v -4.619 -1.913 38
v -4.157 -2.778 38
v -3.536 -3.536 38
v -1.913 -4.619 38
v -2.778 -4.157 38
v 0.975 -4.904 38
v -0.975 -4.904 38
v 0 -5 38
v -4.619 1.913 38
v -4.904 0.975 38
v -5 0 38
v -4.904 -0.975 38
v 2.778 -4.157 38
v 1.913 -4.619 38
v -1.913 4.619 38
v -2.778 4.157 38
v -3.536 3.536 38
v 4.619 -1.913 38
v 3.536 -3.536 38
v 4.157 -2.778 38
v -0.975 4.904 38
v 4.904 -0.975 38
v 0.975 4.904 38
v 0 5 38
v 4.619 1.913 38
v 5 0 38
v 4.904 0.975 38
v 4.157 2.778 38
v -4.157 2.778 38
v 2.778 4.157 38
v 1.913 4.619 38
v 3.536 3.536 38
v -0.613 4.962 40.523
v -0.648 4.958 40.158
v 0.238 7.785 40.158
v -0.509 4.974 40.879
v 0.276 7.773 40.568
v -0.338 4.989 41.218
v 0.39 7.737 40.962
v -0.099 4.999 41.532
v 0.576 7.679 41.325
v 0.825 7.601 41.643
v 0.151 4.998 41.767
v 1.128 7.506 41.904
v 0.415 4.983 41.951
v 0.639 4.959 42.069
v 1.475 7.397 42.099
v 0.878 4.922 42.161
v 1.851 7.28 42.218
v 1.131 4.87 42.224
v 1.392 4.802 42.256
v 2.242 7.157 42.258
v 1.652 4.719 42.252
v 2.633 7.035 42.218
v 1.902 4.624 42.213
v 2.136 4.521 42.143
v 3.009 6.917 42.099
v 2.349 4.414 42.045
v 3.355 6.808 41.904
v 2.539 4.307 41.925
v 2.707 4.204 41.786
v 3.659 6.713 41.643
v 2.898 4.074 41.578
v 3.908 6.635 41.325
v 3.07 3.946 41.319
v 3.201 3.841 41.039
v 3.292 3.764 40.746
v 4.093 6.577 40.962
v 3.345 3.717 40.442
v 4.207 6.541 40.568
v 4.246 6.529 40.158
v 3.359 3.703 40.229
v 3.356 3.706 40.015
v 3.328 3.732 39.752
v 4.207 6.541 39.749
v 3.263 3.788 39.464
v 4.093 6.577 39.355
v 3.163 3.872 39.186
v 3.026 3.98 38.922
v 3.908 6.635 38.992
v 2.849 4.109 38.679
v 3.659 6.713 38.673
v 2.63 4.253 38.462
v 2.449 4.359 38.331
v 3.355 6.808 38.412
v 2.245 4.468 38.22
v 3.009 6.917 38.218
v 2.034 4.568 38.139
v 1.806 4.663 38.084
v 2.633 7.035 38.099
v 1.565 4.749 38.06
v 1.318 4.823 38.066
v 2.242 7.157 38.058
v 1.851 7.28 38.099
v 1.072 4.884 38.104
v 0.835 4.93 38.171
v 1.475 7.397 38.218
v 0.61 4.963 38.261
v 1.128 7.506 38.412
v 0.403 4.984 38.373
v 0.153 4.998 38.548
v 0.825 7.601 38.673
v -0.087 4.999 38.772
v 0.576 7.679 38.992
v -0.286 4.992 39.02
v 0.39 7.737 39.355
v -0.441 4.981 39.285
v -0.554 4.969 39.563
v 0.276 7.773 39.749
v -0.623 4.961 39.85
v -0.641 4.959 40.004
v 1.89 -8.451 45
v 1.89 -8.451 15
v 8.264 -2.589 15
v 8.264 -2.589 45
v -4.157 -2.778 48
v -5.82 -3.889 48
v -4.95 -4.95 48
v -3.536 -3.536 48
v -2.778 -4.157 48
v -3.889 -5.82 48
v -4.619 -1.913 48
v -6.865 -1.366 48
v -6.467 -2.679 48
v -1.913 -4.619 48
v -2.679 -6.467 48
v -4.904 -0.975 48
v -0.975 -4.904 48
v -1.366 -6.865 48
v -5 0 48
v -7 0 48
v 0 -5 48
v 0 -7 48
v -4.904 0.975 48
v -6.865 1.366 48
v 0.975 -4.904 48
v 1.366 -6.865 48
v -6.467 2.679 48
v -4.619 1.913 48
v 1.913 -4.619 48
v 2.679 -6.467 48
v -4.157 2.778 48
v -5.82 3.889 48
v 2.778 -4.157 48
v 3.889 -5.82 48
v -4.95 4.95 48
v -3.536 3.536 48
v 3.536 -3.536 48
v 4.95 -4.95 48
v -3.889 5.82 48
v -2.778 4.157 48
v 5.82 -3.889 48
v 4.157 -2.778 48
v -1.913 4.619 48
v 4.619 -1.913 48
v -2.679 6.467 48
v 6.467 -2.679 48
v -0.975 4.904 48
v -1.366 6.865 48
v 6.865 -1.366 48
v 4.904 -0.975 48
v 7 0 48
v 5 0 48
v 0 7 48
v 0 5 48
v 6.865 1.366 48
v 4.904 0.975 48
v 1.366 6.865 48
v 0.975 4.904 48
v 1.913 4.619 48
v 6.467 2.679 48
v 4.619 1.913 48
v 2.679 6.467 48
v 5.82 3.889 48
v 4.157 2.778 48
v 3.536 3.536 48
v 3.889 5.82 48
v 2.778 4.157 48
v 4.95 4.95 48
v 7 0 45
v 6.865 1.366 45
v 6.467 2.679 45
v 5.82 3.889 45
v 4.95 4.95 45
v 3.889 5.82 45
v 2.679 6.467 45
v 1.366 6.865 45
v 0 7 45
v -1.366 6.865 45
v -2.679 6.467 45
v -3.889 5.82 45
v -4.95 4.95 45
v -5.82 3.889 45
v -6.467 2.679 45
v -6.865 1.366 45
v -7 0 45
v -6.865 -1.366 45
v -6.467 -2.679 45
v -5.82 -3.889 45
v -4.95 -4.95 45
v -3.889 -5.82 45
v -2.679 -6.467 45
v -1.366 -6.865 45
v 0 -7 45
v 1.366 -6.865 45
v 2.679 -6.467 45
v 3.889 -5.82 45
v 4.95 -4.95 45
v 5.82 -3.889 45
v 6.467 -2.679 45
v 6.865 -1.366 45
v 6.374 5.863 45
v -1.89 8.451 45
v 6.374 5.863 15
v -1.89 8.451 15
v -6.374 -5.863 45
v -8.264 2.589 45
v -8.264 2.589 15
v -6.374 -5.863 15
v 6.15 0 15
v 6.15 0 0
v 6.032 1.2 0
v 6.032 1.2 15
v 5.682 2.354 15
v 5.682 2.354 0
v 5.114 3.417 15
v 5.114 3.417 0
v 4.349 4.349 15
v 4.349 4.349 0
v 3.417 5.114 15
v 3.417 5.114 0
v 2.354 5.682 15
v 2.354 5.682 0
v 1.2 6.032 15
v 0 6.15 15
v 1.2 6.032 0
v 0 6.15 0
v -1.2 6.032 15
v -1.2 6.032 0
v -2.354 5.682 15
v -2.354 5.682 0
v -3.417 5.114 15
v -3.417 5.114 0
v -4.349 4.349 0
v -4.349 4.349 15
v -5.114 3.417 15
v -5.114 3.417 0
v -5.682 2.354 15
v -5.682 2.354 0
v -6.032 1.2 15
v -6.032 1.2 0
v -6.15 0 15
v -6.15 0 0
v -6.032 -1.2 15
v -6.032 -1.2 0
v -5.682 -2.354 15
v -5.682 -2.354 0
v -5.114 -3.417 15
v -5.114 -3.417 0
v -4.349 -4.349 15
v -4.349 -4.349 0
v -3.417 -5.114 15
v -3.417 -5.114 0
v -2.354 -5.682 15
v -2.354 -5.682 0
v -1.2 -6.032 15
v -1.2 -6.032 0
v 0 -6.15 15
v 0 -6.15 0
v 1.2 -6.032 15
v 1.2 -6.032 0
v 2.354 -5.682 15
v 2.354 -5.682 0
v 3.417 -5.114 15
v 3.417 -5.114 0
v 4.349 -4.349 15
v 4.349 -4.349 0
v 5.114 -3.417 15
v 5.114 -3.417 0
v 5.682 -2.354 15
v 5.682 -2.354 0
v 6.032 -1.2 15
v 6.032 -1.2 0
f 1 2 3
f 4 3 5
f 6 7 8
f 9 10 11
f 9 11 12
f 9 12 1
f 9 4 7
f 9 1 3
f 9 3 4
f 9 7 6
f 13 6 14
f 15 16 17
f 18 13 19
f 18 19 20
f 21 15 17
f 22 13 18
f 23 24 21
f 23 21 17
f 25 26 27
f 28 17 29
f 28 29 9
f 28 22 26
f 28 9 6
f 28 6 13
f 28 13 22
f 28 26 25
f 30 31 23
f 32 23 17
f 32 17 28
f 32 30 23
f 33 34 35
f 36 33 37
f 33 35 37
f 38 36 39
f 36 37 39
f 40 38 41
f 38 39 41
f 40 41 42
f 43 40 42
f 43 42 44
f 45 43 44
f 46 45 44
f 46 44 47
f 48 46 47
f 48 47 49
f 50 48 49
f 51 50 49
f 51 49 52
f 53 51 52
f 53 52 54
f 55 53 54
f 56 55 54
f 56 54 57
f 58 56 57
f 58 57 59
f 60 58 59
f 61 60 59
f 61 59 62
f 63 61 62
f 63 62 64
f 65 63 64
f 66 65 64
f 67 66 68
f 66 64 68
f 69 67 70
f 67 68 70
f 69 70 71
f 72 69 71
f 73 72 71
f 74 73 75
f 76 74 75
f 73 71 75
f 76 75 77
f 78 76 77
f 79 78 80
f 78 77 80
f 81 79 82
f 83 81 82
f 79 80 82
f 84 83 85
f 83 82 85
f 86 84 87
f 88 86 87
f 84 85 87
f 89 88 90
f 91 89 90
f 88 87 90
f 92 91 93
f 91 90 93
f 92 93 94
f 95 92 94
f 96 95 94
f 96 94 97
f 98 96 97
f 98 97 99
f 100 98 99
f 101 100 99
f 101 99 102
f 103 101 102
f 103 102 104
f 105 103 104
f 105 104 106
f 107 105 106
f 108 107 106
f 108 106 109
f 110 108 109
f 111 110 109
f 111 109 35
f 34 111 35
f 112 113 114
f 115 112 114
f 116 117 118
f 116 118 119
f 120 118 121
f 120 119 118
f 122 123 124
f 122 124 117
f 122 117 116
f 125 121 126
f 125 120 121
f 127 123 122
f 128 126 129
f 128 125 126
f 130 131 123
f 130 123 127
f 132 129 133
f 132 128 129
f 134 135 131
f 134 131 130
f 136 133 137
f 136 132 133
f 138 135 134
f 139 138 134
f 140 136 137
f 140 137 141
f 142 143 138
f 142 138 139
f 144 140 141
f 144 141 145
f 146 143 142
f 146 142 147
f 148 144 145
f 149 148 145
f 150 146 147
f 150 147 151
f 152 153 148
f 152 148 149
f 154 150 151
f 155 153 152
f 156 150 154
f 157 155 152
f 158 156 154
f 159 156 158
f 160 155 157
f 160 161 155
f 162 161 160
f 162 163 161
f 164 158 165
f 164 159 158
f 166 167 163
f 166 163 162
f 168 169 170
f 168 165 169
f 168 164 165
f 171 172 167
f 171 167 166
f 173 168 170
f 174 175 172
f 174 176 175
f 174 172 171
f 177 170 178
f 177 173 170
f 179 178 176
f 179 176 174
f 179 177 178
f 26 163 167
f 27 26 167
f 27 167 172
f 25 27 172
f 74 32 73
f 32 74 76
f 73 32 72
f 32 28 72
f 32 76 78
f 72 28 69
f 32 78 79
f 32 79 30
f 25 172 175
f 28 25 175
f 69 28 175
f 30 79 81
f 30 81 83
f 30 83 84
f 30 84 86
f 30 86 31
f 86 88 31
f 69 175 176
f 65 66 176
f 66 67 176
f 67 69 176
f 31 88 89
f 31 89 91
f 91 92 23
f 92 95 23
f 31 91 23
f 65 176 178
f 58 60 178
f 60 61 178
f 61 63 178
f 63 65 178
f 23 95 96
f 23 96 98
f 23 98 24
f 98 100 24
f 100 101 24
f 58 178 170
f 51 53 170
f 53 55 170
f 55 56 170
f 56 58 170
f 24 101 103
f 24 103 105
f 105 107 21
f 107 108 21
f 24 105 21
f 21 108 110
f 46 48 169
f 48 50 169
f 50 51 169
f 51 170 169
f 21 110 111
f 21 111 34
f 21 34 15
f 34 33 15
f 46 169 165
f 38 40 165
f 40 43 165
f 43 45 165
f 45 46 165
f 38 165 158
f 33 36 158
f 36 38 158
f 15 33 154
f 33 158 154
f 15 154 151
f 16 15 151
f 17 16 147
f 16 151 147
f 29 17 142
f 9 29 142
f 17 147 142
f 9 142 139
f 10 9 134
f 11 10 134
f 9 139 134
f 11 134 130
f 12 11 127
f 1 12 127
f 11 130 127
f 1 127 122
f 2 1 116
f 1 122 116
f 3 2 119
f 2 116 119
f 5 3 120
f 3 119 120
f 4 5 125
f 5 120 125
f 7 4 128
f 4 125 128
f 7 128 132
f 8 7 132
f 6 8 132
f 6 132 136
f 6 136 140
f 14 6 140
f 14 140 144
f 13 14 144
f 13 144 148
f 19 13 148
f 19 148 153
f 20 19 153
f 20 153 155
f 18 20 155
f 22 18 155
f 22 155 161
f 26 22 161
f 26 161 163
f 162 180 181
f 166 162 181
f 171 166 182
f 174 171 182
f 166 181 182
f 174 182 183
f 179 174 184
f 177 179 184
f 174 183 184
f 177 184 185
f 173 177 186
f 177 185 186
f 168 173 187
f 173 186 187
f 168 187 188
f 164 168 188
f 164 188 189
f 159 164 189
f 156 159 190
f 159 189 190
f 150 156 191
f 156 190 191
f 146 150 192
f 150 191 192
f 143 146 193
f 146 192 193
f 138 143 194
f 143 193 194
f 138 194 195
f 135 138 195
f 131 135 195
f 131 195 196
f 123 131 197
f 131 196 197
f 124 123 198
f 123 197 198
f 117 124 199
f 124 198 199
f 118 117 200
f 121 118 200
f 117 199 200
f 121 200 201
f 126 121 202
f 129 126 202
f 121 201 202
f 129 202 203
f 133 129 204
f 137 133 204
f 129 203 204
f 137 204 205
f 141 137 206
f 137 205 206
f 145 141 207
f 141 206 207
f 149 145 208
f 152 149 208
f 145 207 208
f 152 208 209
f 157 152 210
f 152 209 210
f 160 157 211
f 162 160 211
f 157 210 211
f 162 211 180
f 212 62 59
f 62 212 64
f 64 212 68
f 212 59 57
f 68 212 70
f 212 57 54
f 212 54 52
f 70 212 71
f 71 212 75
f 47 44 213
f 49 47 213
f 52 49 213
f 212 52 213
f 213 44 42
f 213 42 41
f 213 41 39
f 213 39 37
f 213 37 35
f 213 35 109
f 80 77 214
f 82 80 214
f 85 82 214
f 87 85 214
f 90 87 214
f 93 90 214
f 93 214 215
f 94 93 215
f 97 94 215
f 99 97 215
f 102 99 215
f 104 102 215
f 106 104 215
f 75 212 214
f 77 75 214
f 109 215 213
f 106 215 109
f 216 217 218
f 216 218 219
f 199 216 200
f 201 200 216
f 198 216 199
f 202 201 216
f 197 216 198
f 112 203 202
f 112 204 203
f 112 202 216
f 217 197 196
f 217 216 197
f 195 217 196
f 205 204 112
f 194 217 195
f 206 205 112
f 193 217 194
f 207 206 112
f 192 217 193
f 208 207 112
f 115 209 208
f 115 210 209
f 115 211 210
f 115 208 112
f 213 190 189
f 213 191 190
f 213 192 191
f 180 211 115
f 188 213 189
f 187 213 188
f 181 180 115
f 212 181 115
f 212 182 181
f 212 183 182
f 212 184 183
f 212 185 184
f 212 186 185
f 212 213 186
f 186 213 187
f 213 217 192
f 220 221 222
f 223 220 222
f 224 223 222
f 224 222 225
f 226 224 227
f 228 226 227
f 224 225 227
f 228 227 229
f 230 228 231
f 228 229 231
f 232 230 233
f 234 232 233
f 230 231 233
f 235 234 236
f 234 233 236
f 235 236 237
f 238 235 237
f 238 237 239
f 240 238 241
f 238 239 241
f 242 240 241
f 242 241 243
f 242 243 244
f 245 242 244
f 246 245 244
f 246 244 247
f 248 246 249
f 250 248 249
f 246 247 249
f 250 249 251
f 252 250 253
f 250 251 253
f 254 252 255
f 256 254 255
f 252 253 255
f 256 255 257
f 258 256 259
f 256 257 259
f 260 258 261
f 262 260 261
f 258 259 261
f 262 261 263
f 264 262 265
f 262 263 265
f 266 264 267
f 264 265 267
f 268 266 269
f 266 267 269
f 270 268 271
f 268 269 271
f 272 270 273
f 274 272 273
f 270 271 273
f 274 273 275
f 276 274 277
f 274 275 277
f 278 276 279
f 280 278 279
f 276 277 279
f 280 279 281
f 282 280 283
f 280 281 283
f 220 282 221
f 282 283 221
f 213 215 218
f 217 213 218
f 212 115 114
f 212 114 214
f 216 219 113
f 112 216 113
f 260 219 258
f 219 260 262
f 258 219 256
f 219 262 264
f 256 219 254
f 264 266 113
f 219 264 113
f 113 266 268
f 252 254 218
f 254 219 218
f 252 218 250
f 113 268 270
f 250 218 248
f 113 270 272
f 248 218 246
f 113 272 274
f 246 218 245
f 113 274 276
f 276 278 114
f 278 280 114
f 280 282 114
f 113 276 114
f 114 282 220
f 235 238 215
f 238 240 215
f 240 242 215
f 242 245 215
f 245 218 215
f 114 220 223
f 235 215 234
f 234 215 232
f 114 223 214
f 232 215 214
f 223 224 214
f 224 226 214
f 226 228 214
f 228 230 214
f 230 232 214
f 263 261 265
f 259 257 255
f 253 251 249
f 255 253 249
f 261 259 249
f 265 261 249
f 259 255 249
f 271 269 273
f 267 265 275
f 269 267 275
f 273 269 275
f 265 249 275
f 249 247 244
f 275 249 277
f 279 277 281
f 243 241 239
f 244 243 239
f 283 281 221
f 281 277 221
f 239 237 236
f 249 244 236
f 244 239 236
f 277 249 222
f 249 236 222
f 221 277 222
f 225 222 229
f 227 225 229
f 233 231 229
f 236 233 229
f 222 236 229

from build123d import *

# Parameters (mm, degrees)
SKETCH_1_R          = 6.15
EXTRUDE_1_DEPTH     = 15
EXTRUDE_2_DEPTH     = 30
SKETCH_3_R          = 7
EXTRUDE_3_DEPTH     = 3
SKETCH_4_R          = 5
CUT_EXTRUDE_1_DEPTH = 10
M5X0_8_1_REACH      = 53.556
M5X0_8_1_BORE_R     = 2.1


with BuildPart() as part:
    # 草图1 → 凸台-拉伸1 (new body)
    with BuildSketch(Plane.XY):
        Circle(SKETCH_1_R)
    extrude(amount=EXTRUDE_1_DEPTH)

    # 草图2 → 凸台-拉伸2 (add)
    with BuildSketch(Plane.XY.offset(15)):
        Polygon((6.373936419, 5.862843552), (-1.890403245, 8.451412638), (-8.264339665, 2.588569085), (-6.373936419, -5.862843552), (1.890403245, -8.451412638), (8.264339665, -2.588569085), align=None)
    extrude(amount=EXTRUDE_2_DEPTH)

    # 草图3 → 凸台-拉伸3 (add)
    with BuildSketch(Plane.XY.offset(45)):
        Circle(SKETCH_3_R)
    extrude(amount=EXTRUDE_3_DEPTH)

    # 草图4 → 切除-拉伸1 (cut)
    with BuildSketch(Plane.XY.offset(48)):
        Circle(SKETCH_4_R)
    extrude(amount=-CUT_EXTRUDE_1_DEPTH, mode=Mode.SUBTRACT)

    # M5x0.8 螺纹孔1 bore → M5x0.8 螺纹孔1 (cut, up to next)
    with BuildSketch(Plane(origin=(2.241766587, 7.157128095, 0), x_dir=(-0.9542837460036324, 0.2989022116232579, 0), z_dir=(0.2989022116232579, 0.9542837460036325, 0)), mode=Mode.PRIVATE) as m5x0_8_1_sk1:
        with Locations((0, 40.158364076)):
            Circle(M5X0_8_1_BORE_R)
    m5x0_8_1_tool1 = extrude(m5x0_8_1_sk1.sketch, amount=-M5X0_8_1_REACH, mode=Mode.PRIVATE) & part.part
    add(m5x0_8_1_tool1.solids().sort_by_distance((2.241767, 7.157128, 40.158364))[0], mode=Mode.SUBTRACT)


solid = part.part
